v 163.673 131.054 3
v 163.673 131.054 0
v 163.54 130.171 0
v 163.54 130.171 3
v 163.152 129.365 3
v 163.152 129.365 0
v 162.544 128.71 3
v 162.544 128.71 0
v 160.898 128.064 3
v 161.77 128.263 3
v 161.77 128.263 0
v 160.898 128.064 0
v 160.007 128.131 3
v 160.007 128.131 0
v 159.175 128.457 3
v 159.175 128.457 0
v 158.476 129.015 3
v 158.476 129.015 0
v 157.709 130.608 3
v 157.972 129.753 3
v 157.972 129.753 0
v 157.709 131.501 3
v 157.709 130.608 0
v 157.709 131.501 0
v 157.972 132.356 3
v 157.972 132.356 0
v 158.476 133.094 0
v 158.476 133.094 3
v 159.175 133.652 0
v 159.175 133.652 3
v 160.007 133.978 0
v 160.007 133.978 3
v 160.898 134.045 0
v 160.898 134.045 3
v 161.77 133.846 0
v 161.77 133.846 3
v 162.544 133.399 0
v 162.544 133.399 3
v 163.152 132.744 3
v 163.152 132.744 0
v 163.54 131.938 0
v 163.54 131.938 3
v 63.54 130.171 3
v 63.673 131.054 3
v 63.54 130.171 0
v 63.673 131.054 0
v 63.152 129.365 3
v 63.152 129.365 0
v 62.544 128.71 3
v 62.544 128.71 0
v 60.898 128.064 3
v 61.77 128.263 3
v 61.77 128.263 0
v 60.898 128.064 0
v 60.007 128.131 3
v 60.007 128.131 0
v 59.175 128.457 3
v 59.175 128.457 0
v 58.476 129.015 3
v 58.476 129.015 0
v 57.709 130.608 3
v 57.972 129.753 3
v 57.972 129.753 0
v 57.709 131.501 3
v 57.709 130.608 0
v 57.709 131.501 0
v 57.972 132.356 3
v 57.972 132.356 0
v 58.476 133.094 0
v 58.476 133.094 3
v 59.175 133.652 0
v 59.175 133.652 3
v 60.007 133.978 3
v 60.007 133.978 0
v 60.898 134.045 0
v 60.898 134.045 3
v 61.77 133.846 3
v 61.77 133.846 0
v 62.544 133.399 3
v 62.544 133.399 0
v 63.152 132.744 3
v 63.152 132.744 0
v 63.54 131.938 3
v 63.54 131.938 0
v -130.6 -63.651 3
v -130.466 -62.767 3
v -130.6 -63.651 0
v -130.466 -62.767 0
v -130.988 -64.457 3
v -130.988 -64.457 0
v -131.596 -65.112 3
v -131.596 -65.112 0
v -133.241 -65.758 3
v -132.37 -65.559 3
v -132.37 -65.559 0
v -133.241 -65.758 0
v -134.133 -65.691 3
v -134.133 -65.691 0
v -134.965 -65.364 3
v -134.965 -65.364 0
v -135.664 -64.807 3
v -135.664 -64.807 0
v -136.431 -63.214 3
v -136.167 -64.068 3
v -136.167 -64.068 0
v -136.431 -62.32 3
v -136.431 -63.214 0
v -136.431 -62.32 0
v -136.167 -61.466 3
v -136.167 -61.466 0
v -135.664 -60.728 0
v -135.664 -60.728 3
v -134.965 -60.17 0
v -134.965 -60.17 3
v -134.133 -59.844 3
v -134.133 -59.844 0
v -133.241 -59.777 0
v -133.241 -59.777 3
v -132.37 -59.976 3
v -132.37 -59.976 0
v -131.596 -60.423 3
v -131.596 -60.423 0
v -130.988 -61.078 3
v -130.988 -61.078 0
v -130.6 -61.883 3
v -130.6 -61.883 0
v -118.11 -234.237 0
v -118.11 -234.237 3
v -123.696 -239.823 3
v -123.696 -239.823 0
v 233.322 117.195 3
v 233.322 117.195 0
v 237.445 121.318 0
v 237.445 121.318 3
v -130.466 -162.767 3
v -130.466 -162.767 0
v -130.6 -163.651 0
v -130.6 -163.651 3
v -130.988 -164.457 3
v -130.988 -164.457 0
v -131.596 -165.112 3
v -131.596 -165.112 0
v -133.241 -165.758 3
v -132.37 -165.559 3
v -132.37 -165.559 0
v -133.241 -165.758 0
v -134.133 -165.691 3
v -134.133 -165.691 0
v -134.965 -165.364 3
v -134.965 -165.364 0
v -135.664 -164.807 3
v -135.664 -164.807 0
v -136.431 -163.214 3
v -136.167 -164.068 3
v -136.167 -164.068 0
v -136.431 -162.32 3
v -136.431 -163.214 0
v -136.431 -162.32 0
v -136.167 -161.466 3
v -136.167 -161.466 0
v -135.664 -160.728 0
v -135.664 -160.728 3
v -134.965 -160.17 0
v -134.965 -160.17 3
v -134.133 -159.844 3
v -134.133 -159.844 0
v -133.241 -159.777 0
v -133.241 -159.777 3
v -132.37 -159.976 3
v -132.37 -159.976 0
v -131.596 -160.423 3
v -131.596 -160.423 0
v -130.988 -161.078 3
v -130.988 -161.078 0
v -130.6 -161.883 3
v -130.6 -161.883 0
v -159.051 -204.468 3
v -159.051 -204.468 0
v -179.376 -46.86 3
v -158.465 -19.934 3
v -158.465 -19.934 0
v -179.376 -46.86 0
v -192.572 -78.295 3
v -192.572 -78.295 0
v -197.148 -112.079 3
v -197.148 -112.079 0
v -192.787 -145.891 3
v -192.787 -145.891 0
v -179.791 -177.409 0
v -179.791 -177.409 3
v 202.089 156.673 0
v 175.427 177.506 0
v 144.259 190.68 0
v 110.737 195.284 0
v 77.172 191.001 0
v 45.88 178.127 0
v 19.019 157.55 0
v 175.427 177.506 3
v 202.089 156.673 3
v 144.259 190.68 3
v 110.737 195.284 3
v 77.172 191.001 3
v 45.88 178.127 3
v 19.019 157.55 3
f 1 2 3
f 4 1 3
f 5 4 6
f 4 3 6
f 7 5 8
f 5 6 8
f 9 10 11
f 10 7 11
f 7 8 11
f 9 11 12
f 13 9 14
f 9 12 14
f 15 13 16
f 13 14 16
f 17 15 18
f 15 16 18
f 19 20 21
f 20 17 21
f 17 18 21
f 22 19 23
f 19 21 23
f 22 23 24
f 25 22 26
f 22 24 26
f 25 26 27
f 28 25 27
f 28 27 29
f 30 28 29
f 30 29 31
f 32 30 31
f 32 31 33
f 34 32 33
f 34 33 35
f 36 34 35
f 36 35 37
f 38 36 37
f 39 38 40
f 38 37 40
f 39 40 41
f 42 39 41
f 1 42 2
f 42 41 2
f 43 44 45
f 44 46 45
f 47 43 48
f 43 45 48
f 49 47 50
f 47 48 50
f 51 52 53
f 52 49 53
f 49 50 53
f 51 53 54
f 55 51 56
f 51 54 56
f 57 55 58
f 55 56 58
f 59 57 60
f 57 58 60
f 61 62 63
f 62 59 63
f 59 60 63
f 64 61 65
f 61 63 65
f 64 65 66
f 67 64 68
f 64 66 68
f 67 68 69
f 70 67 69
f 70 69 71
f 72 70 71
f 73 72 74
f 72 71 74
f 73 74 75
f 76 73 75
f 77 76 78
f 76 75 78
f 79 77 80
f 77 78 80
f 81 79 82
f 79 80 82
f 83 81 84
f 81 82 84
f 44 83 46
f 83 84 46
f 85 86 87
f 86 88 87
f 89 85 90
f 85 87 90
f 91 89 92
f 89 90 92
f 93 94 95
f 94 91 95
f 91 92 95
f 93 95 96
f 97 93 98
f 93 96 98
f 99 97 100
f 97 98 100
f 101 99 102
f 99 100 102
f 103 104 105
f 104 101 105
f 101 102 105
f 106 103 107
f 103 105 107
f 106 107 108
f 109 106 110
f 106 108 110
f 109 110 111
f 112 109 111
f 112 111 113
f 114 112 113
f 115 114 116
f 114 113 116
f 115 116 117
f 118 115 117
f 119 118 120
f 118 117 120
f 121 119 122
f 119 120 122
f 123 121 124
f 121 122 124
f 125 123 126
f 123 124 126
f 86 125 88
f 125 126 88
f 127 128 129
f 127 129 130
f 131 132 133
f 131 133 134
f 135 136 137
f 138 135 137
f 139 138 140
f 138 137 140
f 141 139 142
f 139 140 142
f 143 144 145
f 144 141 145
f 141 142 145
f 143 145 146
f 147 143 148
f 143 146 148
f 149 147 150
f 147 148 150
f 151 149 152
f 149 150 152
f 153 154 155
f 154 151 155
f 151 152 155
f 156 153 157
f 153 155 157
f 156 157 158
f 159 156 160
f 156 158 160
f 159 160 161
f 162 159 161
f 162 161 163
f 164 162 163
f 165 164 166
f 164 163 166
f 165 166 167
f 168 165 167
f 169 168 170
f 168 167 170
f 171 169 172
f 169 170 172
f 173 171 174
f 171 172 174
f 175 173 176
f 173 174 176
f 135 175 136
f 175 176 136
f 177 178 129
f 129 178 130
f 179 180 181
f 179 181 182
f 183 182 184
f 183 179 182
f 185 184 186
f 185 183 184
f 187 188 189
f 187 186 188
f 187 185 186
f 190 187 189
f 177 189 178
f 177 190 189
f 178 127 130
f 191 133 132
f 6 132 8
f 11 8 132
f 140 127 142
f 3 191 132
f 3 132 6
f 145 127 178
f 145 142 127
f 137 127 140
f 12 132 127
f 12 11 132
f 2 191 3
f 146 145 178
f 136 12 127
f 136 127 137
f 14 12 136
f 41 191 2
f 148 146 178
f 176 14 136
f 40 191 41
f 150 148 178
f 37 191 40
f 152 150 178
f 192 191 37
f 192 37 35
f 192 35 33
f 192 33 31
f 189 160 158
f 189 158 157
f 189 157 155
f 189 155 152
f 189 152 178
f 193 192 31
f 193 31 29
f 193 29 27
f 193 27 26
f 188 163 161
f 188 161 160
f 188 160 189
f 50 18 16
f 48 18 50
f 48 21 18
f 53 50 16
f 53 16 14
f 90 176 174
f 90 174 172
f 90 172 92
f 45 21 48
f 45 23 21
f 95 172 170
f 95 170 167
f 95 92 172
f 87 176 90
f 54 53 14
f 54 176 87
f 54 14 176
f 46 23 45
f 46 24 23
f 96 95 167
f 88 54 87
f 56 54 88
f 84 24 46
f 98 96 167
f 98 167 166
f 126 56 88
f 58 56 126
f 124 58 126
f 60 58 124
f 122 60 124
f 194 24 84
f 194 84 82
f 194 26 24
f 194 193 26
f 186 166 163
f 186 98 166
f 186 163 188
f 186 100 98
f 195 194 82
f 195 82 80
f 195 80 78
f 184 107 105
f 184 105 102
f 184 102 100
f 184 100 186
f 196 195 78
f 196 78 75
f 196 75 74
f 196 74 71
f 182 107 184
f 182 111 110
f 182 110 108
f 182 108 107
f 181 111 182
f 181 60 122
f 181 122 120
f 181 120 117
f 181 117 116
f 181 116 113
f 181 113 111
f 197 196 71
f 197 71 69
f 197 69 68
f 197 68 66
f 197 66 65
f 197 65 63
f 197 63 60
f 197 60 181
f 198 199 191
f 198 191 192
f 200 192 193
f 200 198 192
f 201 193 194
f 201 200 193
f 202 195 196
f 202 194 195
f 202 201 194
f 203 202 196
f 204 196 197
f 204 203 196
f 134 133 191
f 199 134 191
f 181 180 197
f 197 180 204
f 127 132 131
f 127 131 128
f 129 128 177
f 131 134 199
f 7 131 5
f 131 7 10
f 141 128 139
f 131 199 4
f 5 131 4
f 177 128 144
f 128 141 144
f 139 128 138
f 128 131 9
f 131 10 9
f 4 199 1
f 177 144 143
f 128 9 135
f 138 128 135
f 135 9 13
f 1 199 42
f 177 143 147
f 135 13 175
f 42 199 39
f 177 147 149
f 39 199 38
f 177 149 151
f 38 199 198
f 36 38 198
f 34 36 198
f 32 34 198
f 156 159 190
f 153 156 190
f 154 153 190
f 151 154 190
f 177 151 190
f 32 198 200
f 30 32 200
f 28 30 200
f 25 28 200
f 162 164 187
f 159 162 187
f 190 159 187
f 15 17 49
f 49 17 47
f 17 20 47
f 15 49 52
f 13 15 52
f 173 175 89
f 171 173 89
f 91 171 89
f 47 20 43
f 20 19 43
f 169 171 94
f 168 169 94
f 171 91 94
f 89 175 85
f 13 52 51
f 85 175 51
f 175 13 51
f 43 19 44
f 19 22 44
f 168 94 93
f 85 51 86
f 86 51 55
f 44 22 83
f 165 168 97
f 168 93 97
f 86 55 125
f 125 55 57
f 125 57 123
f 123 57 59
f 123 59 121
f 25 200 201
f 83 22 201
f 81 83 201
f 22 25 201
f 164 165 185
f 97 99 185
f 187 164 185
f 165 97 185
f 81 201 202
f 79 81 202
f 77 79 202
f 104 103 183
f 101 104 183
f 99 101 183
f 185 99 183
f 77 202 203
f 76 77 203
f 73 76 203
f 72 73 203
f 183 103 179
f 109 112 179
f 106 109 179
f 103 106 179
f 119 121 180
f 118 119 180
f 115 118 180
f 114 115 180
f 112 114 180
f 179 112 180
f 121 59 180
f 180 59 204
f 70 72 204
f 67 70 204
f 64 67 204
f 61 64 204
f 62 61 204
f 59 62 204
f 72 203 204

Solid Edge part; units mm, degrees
sketch "Sketch1" plane through (0, 0, 0) normal (0, 0, 1) x (1, 0, 0)
  line L0 (233.3222, 117.1952) -> (-118.1099, -234.2368)
  line L1 (-118.1099, -234.2368) -> (-153.4653, -198.8815)
  line L2 (-153.4653, -198.8815) -> (-153.4653, -24.9332)
  line L3 (-153.4653, -24.9332) -> (24.0185, 152.5506)
  line L4 (24.0185, 152.5506) -> (197.9668, 152.5506)
  line L5 (197.9668, 152.5506) -> (233.3222, 117.1952)
  circle A0 centre (-133.4653, -62.7673) radius 2.9988
  circle A1 centre (-133.4653, -162.7673) radius 2.9988
  circle A2 centre (60.674, 131.0545) radius 2.9988
  circle A3 centre (160.674, 131.0545) radius 2.9988
  dimension "D1" = 497
  dimension "D2" = 50
  dimension "D3" = 173
  dimension "D4" = 5.9975
  dimension "D5" = 100
  dimension "D6" = 20
  dimension "D7" = 100
  dimension "D8" = 274.33
  dimension "D9" = 41.57
  dimension "D10" = 11.17
extrude "Protrusion1" add sketch "Sketch1" along normal blind 3
sketch "Sketch2" plane through (215.6445, 134.8729, 1.5) normal (0.7071068, 0.7071068, 0) x (0.7071068, -0.7071068, 0)
  line L0 (-25, 1.5) -> (25, 1.5)
  line L1 (25, 1.5) -> (25, -1.5)
  line L2 (25, -1.5) -> (-25, -1.5)
  line L3 (-25, -1.5) -> (-25, 1.5)
extrude "Extrusionsausprägung_2" add sketch "Sketch2" along normal blind 5.83
sketch "Sketch3" plane through (-135.7876, -216.5592, 1.5) normal (-0.7071068, -0.7071068, 0) x (0.7071068, -0.7071068, 0)
  line L0 (-25, 1.5) -> (25, 1.5)
  line L1 (25, 1.5) -> (25, -1.5)
  line L2 (25, -1.5) -> (-25, -1.5)
  line L3 (-25, -1.5) -> (-25, 1.5)
extrude "Extrusionsausprägung_3" add sketch "Sketch3" along normal blind 7.9
sketch "Sketch4" plane through (-64.7234, 63.8087, 1.5) normal (-0.7071068, 0.7071068, 0) x (-0.7071068, -0.7071068, 0)
  line L0 (-125.5, 1.5) -> (125.5, 1.5)
  line L1 (125.5, 1.5) -> (125.5, -1.5)
  line L2 (125.5, -1.5) -> (-125.5, -1.5)
  line L3 (-125.5, -1.5) -> (-125.5, 1.5)
extrude "Extrusionsausprägung_4" add sketch "Sketch4" along normal blind 7.07
sketch "Sketch5" plane through (39.1294, -41.2038, 3) normal (0, 0, 1) x (1, 0, 0)
  line L0 (-197.5939, 21.2698) -> (-192.5947, 16.2705)
  line L1 (-192.5947, 16.2705) -> (-192.5947, -157.6777)
  line L2 (-192.5947, -157.6777) -> (-198.1808, -163.2639)
  arc A0 (-198.1808, -163.2639) -> (-197.5939, 21.2698) centre (-106.2037, -71.2887) cw
extrude "Protrusion2" add sketch "Sketch5" against normal up to vertex (3 mm away)
sketch "Sketch6" plane through (20.0805, -41.2038, 3) normal (0, 0, 1) x (1, 0, 0)
  line L0 (-1.0612, 198.7536) -> (3.938, 193.7543)
  line L1 (3.938, 193.7543) -> (177.8863, 193.7543)
  line L2 (177.8863, 193.7543) -> (182.0087, 197.8768)
  arc A0 (-1.0612, 198.7536) -> (182.0087, 197.8768) centre (90.0395, 107.6528) cw
extrude "Protrusion3" add sketch "Sketch6" against normal up to vertex (3 mm away)
properties material "Nylon, allgemein"
